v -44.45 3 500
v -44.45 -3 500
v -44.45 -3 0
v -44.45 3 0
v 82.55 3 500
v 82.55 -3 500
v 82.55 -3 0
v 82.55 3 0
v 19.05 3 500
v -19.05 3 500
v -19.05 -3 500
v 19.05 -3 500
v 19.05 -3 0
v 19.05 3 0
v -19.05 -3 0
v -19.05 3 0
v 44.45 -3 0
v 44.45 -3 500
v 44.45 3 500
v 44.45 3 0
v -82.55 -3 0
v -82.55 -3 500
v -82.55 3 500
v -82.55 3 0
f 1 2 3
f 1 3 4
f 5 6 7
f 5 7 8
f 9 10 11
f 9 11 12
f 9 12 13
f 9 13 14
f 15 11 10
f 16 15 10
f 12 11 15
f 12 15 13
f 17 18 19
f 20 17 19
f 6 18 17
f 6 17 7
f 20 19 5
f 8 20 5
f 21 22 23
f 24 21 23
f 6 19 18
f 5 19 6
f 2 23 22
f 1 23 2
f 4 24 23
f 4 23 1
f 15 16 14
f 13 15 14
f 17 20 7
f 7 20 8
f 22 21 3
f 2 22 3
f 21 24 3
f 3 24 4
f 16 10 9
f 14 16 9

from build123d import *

# Parameters (mm, degrees)
CROQUIS1_W                = 38.1
CROQUIS1_H                = 6
SALIENTE_EXTRUIR1_DEPTH   = 500
SALIENTE_EXTRUIR1_2_DEPTH = 500
SALIENTE_EXTRUIR1_3_DEPTH = 500


with BuildPart() as part:
    # Croquis1 → Saliente-Extruir1 (new body)
    with BuildSketch(Plane.XY):
        Rectangle(CROQUIS1_W, CROQUIS1_H)
    extrude(amount=SALIENTE_EXTRUIR1_DEPTH)


with BuildPart() as body_2:
    # Croquis1 → Saliente-Extruir1 2 (new body)
    with BuildSketch(Plane.XY):
        with Locations((-63.5, 0)):
            Rectangle(CROQUIS1_W, CROQUIS1_H)
    extrude(amount=SALIENTE_EXTRUIR1_2_DEPTH)


with BuildPart() as body_3:
    # Croquis1 → Saliente-Extruir1 3 (new body)
    with BuildSketch(Plane.XY):
        with Locations((63.5, 0)):
            Rectangle(CROQUIS1_W, CROQUIS1_H)
    extrude(amount=SALIENTE_EXTRUIR1_3_DEPTH)


solid = Compound([part.part, body_2.part, body_3.part])
